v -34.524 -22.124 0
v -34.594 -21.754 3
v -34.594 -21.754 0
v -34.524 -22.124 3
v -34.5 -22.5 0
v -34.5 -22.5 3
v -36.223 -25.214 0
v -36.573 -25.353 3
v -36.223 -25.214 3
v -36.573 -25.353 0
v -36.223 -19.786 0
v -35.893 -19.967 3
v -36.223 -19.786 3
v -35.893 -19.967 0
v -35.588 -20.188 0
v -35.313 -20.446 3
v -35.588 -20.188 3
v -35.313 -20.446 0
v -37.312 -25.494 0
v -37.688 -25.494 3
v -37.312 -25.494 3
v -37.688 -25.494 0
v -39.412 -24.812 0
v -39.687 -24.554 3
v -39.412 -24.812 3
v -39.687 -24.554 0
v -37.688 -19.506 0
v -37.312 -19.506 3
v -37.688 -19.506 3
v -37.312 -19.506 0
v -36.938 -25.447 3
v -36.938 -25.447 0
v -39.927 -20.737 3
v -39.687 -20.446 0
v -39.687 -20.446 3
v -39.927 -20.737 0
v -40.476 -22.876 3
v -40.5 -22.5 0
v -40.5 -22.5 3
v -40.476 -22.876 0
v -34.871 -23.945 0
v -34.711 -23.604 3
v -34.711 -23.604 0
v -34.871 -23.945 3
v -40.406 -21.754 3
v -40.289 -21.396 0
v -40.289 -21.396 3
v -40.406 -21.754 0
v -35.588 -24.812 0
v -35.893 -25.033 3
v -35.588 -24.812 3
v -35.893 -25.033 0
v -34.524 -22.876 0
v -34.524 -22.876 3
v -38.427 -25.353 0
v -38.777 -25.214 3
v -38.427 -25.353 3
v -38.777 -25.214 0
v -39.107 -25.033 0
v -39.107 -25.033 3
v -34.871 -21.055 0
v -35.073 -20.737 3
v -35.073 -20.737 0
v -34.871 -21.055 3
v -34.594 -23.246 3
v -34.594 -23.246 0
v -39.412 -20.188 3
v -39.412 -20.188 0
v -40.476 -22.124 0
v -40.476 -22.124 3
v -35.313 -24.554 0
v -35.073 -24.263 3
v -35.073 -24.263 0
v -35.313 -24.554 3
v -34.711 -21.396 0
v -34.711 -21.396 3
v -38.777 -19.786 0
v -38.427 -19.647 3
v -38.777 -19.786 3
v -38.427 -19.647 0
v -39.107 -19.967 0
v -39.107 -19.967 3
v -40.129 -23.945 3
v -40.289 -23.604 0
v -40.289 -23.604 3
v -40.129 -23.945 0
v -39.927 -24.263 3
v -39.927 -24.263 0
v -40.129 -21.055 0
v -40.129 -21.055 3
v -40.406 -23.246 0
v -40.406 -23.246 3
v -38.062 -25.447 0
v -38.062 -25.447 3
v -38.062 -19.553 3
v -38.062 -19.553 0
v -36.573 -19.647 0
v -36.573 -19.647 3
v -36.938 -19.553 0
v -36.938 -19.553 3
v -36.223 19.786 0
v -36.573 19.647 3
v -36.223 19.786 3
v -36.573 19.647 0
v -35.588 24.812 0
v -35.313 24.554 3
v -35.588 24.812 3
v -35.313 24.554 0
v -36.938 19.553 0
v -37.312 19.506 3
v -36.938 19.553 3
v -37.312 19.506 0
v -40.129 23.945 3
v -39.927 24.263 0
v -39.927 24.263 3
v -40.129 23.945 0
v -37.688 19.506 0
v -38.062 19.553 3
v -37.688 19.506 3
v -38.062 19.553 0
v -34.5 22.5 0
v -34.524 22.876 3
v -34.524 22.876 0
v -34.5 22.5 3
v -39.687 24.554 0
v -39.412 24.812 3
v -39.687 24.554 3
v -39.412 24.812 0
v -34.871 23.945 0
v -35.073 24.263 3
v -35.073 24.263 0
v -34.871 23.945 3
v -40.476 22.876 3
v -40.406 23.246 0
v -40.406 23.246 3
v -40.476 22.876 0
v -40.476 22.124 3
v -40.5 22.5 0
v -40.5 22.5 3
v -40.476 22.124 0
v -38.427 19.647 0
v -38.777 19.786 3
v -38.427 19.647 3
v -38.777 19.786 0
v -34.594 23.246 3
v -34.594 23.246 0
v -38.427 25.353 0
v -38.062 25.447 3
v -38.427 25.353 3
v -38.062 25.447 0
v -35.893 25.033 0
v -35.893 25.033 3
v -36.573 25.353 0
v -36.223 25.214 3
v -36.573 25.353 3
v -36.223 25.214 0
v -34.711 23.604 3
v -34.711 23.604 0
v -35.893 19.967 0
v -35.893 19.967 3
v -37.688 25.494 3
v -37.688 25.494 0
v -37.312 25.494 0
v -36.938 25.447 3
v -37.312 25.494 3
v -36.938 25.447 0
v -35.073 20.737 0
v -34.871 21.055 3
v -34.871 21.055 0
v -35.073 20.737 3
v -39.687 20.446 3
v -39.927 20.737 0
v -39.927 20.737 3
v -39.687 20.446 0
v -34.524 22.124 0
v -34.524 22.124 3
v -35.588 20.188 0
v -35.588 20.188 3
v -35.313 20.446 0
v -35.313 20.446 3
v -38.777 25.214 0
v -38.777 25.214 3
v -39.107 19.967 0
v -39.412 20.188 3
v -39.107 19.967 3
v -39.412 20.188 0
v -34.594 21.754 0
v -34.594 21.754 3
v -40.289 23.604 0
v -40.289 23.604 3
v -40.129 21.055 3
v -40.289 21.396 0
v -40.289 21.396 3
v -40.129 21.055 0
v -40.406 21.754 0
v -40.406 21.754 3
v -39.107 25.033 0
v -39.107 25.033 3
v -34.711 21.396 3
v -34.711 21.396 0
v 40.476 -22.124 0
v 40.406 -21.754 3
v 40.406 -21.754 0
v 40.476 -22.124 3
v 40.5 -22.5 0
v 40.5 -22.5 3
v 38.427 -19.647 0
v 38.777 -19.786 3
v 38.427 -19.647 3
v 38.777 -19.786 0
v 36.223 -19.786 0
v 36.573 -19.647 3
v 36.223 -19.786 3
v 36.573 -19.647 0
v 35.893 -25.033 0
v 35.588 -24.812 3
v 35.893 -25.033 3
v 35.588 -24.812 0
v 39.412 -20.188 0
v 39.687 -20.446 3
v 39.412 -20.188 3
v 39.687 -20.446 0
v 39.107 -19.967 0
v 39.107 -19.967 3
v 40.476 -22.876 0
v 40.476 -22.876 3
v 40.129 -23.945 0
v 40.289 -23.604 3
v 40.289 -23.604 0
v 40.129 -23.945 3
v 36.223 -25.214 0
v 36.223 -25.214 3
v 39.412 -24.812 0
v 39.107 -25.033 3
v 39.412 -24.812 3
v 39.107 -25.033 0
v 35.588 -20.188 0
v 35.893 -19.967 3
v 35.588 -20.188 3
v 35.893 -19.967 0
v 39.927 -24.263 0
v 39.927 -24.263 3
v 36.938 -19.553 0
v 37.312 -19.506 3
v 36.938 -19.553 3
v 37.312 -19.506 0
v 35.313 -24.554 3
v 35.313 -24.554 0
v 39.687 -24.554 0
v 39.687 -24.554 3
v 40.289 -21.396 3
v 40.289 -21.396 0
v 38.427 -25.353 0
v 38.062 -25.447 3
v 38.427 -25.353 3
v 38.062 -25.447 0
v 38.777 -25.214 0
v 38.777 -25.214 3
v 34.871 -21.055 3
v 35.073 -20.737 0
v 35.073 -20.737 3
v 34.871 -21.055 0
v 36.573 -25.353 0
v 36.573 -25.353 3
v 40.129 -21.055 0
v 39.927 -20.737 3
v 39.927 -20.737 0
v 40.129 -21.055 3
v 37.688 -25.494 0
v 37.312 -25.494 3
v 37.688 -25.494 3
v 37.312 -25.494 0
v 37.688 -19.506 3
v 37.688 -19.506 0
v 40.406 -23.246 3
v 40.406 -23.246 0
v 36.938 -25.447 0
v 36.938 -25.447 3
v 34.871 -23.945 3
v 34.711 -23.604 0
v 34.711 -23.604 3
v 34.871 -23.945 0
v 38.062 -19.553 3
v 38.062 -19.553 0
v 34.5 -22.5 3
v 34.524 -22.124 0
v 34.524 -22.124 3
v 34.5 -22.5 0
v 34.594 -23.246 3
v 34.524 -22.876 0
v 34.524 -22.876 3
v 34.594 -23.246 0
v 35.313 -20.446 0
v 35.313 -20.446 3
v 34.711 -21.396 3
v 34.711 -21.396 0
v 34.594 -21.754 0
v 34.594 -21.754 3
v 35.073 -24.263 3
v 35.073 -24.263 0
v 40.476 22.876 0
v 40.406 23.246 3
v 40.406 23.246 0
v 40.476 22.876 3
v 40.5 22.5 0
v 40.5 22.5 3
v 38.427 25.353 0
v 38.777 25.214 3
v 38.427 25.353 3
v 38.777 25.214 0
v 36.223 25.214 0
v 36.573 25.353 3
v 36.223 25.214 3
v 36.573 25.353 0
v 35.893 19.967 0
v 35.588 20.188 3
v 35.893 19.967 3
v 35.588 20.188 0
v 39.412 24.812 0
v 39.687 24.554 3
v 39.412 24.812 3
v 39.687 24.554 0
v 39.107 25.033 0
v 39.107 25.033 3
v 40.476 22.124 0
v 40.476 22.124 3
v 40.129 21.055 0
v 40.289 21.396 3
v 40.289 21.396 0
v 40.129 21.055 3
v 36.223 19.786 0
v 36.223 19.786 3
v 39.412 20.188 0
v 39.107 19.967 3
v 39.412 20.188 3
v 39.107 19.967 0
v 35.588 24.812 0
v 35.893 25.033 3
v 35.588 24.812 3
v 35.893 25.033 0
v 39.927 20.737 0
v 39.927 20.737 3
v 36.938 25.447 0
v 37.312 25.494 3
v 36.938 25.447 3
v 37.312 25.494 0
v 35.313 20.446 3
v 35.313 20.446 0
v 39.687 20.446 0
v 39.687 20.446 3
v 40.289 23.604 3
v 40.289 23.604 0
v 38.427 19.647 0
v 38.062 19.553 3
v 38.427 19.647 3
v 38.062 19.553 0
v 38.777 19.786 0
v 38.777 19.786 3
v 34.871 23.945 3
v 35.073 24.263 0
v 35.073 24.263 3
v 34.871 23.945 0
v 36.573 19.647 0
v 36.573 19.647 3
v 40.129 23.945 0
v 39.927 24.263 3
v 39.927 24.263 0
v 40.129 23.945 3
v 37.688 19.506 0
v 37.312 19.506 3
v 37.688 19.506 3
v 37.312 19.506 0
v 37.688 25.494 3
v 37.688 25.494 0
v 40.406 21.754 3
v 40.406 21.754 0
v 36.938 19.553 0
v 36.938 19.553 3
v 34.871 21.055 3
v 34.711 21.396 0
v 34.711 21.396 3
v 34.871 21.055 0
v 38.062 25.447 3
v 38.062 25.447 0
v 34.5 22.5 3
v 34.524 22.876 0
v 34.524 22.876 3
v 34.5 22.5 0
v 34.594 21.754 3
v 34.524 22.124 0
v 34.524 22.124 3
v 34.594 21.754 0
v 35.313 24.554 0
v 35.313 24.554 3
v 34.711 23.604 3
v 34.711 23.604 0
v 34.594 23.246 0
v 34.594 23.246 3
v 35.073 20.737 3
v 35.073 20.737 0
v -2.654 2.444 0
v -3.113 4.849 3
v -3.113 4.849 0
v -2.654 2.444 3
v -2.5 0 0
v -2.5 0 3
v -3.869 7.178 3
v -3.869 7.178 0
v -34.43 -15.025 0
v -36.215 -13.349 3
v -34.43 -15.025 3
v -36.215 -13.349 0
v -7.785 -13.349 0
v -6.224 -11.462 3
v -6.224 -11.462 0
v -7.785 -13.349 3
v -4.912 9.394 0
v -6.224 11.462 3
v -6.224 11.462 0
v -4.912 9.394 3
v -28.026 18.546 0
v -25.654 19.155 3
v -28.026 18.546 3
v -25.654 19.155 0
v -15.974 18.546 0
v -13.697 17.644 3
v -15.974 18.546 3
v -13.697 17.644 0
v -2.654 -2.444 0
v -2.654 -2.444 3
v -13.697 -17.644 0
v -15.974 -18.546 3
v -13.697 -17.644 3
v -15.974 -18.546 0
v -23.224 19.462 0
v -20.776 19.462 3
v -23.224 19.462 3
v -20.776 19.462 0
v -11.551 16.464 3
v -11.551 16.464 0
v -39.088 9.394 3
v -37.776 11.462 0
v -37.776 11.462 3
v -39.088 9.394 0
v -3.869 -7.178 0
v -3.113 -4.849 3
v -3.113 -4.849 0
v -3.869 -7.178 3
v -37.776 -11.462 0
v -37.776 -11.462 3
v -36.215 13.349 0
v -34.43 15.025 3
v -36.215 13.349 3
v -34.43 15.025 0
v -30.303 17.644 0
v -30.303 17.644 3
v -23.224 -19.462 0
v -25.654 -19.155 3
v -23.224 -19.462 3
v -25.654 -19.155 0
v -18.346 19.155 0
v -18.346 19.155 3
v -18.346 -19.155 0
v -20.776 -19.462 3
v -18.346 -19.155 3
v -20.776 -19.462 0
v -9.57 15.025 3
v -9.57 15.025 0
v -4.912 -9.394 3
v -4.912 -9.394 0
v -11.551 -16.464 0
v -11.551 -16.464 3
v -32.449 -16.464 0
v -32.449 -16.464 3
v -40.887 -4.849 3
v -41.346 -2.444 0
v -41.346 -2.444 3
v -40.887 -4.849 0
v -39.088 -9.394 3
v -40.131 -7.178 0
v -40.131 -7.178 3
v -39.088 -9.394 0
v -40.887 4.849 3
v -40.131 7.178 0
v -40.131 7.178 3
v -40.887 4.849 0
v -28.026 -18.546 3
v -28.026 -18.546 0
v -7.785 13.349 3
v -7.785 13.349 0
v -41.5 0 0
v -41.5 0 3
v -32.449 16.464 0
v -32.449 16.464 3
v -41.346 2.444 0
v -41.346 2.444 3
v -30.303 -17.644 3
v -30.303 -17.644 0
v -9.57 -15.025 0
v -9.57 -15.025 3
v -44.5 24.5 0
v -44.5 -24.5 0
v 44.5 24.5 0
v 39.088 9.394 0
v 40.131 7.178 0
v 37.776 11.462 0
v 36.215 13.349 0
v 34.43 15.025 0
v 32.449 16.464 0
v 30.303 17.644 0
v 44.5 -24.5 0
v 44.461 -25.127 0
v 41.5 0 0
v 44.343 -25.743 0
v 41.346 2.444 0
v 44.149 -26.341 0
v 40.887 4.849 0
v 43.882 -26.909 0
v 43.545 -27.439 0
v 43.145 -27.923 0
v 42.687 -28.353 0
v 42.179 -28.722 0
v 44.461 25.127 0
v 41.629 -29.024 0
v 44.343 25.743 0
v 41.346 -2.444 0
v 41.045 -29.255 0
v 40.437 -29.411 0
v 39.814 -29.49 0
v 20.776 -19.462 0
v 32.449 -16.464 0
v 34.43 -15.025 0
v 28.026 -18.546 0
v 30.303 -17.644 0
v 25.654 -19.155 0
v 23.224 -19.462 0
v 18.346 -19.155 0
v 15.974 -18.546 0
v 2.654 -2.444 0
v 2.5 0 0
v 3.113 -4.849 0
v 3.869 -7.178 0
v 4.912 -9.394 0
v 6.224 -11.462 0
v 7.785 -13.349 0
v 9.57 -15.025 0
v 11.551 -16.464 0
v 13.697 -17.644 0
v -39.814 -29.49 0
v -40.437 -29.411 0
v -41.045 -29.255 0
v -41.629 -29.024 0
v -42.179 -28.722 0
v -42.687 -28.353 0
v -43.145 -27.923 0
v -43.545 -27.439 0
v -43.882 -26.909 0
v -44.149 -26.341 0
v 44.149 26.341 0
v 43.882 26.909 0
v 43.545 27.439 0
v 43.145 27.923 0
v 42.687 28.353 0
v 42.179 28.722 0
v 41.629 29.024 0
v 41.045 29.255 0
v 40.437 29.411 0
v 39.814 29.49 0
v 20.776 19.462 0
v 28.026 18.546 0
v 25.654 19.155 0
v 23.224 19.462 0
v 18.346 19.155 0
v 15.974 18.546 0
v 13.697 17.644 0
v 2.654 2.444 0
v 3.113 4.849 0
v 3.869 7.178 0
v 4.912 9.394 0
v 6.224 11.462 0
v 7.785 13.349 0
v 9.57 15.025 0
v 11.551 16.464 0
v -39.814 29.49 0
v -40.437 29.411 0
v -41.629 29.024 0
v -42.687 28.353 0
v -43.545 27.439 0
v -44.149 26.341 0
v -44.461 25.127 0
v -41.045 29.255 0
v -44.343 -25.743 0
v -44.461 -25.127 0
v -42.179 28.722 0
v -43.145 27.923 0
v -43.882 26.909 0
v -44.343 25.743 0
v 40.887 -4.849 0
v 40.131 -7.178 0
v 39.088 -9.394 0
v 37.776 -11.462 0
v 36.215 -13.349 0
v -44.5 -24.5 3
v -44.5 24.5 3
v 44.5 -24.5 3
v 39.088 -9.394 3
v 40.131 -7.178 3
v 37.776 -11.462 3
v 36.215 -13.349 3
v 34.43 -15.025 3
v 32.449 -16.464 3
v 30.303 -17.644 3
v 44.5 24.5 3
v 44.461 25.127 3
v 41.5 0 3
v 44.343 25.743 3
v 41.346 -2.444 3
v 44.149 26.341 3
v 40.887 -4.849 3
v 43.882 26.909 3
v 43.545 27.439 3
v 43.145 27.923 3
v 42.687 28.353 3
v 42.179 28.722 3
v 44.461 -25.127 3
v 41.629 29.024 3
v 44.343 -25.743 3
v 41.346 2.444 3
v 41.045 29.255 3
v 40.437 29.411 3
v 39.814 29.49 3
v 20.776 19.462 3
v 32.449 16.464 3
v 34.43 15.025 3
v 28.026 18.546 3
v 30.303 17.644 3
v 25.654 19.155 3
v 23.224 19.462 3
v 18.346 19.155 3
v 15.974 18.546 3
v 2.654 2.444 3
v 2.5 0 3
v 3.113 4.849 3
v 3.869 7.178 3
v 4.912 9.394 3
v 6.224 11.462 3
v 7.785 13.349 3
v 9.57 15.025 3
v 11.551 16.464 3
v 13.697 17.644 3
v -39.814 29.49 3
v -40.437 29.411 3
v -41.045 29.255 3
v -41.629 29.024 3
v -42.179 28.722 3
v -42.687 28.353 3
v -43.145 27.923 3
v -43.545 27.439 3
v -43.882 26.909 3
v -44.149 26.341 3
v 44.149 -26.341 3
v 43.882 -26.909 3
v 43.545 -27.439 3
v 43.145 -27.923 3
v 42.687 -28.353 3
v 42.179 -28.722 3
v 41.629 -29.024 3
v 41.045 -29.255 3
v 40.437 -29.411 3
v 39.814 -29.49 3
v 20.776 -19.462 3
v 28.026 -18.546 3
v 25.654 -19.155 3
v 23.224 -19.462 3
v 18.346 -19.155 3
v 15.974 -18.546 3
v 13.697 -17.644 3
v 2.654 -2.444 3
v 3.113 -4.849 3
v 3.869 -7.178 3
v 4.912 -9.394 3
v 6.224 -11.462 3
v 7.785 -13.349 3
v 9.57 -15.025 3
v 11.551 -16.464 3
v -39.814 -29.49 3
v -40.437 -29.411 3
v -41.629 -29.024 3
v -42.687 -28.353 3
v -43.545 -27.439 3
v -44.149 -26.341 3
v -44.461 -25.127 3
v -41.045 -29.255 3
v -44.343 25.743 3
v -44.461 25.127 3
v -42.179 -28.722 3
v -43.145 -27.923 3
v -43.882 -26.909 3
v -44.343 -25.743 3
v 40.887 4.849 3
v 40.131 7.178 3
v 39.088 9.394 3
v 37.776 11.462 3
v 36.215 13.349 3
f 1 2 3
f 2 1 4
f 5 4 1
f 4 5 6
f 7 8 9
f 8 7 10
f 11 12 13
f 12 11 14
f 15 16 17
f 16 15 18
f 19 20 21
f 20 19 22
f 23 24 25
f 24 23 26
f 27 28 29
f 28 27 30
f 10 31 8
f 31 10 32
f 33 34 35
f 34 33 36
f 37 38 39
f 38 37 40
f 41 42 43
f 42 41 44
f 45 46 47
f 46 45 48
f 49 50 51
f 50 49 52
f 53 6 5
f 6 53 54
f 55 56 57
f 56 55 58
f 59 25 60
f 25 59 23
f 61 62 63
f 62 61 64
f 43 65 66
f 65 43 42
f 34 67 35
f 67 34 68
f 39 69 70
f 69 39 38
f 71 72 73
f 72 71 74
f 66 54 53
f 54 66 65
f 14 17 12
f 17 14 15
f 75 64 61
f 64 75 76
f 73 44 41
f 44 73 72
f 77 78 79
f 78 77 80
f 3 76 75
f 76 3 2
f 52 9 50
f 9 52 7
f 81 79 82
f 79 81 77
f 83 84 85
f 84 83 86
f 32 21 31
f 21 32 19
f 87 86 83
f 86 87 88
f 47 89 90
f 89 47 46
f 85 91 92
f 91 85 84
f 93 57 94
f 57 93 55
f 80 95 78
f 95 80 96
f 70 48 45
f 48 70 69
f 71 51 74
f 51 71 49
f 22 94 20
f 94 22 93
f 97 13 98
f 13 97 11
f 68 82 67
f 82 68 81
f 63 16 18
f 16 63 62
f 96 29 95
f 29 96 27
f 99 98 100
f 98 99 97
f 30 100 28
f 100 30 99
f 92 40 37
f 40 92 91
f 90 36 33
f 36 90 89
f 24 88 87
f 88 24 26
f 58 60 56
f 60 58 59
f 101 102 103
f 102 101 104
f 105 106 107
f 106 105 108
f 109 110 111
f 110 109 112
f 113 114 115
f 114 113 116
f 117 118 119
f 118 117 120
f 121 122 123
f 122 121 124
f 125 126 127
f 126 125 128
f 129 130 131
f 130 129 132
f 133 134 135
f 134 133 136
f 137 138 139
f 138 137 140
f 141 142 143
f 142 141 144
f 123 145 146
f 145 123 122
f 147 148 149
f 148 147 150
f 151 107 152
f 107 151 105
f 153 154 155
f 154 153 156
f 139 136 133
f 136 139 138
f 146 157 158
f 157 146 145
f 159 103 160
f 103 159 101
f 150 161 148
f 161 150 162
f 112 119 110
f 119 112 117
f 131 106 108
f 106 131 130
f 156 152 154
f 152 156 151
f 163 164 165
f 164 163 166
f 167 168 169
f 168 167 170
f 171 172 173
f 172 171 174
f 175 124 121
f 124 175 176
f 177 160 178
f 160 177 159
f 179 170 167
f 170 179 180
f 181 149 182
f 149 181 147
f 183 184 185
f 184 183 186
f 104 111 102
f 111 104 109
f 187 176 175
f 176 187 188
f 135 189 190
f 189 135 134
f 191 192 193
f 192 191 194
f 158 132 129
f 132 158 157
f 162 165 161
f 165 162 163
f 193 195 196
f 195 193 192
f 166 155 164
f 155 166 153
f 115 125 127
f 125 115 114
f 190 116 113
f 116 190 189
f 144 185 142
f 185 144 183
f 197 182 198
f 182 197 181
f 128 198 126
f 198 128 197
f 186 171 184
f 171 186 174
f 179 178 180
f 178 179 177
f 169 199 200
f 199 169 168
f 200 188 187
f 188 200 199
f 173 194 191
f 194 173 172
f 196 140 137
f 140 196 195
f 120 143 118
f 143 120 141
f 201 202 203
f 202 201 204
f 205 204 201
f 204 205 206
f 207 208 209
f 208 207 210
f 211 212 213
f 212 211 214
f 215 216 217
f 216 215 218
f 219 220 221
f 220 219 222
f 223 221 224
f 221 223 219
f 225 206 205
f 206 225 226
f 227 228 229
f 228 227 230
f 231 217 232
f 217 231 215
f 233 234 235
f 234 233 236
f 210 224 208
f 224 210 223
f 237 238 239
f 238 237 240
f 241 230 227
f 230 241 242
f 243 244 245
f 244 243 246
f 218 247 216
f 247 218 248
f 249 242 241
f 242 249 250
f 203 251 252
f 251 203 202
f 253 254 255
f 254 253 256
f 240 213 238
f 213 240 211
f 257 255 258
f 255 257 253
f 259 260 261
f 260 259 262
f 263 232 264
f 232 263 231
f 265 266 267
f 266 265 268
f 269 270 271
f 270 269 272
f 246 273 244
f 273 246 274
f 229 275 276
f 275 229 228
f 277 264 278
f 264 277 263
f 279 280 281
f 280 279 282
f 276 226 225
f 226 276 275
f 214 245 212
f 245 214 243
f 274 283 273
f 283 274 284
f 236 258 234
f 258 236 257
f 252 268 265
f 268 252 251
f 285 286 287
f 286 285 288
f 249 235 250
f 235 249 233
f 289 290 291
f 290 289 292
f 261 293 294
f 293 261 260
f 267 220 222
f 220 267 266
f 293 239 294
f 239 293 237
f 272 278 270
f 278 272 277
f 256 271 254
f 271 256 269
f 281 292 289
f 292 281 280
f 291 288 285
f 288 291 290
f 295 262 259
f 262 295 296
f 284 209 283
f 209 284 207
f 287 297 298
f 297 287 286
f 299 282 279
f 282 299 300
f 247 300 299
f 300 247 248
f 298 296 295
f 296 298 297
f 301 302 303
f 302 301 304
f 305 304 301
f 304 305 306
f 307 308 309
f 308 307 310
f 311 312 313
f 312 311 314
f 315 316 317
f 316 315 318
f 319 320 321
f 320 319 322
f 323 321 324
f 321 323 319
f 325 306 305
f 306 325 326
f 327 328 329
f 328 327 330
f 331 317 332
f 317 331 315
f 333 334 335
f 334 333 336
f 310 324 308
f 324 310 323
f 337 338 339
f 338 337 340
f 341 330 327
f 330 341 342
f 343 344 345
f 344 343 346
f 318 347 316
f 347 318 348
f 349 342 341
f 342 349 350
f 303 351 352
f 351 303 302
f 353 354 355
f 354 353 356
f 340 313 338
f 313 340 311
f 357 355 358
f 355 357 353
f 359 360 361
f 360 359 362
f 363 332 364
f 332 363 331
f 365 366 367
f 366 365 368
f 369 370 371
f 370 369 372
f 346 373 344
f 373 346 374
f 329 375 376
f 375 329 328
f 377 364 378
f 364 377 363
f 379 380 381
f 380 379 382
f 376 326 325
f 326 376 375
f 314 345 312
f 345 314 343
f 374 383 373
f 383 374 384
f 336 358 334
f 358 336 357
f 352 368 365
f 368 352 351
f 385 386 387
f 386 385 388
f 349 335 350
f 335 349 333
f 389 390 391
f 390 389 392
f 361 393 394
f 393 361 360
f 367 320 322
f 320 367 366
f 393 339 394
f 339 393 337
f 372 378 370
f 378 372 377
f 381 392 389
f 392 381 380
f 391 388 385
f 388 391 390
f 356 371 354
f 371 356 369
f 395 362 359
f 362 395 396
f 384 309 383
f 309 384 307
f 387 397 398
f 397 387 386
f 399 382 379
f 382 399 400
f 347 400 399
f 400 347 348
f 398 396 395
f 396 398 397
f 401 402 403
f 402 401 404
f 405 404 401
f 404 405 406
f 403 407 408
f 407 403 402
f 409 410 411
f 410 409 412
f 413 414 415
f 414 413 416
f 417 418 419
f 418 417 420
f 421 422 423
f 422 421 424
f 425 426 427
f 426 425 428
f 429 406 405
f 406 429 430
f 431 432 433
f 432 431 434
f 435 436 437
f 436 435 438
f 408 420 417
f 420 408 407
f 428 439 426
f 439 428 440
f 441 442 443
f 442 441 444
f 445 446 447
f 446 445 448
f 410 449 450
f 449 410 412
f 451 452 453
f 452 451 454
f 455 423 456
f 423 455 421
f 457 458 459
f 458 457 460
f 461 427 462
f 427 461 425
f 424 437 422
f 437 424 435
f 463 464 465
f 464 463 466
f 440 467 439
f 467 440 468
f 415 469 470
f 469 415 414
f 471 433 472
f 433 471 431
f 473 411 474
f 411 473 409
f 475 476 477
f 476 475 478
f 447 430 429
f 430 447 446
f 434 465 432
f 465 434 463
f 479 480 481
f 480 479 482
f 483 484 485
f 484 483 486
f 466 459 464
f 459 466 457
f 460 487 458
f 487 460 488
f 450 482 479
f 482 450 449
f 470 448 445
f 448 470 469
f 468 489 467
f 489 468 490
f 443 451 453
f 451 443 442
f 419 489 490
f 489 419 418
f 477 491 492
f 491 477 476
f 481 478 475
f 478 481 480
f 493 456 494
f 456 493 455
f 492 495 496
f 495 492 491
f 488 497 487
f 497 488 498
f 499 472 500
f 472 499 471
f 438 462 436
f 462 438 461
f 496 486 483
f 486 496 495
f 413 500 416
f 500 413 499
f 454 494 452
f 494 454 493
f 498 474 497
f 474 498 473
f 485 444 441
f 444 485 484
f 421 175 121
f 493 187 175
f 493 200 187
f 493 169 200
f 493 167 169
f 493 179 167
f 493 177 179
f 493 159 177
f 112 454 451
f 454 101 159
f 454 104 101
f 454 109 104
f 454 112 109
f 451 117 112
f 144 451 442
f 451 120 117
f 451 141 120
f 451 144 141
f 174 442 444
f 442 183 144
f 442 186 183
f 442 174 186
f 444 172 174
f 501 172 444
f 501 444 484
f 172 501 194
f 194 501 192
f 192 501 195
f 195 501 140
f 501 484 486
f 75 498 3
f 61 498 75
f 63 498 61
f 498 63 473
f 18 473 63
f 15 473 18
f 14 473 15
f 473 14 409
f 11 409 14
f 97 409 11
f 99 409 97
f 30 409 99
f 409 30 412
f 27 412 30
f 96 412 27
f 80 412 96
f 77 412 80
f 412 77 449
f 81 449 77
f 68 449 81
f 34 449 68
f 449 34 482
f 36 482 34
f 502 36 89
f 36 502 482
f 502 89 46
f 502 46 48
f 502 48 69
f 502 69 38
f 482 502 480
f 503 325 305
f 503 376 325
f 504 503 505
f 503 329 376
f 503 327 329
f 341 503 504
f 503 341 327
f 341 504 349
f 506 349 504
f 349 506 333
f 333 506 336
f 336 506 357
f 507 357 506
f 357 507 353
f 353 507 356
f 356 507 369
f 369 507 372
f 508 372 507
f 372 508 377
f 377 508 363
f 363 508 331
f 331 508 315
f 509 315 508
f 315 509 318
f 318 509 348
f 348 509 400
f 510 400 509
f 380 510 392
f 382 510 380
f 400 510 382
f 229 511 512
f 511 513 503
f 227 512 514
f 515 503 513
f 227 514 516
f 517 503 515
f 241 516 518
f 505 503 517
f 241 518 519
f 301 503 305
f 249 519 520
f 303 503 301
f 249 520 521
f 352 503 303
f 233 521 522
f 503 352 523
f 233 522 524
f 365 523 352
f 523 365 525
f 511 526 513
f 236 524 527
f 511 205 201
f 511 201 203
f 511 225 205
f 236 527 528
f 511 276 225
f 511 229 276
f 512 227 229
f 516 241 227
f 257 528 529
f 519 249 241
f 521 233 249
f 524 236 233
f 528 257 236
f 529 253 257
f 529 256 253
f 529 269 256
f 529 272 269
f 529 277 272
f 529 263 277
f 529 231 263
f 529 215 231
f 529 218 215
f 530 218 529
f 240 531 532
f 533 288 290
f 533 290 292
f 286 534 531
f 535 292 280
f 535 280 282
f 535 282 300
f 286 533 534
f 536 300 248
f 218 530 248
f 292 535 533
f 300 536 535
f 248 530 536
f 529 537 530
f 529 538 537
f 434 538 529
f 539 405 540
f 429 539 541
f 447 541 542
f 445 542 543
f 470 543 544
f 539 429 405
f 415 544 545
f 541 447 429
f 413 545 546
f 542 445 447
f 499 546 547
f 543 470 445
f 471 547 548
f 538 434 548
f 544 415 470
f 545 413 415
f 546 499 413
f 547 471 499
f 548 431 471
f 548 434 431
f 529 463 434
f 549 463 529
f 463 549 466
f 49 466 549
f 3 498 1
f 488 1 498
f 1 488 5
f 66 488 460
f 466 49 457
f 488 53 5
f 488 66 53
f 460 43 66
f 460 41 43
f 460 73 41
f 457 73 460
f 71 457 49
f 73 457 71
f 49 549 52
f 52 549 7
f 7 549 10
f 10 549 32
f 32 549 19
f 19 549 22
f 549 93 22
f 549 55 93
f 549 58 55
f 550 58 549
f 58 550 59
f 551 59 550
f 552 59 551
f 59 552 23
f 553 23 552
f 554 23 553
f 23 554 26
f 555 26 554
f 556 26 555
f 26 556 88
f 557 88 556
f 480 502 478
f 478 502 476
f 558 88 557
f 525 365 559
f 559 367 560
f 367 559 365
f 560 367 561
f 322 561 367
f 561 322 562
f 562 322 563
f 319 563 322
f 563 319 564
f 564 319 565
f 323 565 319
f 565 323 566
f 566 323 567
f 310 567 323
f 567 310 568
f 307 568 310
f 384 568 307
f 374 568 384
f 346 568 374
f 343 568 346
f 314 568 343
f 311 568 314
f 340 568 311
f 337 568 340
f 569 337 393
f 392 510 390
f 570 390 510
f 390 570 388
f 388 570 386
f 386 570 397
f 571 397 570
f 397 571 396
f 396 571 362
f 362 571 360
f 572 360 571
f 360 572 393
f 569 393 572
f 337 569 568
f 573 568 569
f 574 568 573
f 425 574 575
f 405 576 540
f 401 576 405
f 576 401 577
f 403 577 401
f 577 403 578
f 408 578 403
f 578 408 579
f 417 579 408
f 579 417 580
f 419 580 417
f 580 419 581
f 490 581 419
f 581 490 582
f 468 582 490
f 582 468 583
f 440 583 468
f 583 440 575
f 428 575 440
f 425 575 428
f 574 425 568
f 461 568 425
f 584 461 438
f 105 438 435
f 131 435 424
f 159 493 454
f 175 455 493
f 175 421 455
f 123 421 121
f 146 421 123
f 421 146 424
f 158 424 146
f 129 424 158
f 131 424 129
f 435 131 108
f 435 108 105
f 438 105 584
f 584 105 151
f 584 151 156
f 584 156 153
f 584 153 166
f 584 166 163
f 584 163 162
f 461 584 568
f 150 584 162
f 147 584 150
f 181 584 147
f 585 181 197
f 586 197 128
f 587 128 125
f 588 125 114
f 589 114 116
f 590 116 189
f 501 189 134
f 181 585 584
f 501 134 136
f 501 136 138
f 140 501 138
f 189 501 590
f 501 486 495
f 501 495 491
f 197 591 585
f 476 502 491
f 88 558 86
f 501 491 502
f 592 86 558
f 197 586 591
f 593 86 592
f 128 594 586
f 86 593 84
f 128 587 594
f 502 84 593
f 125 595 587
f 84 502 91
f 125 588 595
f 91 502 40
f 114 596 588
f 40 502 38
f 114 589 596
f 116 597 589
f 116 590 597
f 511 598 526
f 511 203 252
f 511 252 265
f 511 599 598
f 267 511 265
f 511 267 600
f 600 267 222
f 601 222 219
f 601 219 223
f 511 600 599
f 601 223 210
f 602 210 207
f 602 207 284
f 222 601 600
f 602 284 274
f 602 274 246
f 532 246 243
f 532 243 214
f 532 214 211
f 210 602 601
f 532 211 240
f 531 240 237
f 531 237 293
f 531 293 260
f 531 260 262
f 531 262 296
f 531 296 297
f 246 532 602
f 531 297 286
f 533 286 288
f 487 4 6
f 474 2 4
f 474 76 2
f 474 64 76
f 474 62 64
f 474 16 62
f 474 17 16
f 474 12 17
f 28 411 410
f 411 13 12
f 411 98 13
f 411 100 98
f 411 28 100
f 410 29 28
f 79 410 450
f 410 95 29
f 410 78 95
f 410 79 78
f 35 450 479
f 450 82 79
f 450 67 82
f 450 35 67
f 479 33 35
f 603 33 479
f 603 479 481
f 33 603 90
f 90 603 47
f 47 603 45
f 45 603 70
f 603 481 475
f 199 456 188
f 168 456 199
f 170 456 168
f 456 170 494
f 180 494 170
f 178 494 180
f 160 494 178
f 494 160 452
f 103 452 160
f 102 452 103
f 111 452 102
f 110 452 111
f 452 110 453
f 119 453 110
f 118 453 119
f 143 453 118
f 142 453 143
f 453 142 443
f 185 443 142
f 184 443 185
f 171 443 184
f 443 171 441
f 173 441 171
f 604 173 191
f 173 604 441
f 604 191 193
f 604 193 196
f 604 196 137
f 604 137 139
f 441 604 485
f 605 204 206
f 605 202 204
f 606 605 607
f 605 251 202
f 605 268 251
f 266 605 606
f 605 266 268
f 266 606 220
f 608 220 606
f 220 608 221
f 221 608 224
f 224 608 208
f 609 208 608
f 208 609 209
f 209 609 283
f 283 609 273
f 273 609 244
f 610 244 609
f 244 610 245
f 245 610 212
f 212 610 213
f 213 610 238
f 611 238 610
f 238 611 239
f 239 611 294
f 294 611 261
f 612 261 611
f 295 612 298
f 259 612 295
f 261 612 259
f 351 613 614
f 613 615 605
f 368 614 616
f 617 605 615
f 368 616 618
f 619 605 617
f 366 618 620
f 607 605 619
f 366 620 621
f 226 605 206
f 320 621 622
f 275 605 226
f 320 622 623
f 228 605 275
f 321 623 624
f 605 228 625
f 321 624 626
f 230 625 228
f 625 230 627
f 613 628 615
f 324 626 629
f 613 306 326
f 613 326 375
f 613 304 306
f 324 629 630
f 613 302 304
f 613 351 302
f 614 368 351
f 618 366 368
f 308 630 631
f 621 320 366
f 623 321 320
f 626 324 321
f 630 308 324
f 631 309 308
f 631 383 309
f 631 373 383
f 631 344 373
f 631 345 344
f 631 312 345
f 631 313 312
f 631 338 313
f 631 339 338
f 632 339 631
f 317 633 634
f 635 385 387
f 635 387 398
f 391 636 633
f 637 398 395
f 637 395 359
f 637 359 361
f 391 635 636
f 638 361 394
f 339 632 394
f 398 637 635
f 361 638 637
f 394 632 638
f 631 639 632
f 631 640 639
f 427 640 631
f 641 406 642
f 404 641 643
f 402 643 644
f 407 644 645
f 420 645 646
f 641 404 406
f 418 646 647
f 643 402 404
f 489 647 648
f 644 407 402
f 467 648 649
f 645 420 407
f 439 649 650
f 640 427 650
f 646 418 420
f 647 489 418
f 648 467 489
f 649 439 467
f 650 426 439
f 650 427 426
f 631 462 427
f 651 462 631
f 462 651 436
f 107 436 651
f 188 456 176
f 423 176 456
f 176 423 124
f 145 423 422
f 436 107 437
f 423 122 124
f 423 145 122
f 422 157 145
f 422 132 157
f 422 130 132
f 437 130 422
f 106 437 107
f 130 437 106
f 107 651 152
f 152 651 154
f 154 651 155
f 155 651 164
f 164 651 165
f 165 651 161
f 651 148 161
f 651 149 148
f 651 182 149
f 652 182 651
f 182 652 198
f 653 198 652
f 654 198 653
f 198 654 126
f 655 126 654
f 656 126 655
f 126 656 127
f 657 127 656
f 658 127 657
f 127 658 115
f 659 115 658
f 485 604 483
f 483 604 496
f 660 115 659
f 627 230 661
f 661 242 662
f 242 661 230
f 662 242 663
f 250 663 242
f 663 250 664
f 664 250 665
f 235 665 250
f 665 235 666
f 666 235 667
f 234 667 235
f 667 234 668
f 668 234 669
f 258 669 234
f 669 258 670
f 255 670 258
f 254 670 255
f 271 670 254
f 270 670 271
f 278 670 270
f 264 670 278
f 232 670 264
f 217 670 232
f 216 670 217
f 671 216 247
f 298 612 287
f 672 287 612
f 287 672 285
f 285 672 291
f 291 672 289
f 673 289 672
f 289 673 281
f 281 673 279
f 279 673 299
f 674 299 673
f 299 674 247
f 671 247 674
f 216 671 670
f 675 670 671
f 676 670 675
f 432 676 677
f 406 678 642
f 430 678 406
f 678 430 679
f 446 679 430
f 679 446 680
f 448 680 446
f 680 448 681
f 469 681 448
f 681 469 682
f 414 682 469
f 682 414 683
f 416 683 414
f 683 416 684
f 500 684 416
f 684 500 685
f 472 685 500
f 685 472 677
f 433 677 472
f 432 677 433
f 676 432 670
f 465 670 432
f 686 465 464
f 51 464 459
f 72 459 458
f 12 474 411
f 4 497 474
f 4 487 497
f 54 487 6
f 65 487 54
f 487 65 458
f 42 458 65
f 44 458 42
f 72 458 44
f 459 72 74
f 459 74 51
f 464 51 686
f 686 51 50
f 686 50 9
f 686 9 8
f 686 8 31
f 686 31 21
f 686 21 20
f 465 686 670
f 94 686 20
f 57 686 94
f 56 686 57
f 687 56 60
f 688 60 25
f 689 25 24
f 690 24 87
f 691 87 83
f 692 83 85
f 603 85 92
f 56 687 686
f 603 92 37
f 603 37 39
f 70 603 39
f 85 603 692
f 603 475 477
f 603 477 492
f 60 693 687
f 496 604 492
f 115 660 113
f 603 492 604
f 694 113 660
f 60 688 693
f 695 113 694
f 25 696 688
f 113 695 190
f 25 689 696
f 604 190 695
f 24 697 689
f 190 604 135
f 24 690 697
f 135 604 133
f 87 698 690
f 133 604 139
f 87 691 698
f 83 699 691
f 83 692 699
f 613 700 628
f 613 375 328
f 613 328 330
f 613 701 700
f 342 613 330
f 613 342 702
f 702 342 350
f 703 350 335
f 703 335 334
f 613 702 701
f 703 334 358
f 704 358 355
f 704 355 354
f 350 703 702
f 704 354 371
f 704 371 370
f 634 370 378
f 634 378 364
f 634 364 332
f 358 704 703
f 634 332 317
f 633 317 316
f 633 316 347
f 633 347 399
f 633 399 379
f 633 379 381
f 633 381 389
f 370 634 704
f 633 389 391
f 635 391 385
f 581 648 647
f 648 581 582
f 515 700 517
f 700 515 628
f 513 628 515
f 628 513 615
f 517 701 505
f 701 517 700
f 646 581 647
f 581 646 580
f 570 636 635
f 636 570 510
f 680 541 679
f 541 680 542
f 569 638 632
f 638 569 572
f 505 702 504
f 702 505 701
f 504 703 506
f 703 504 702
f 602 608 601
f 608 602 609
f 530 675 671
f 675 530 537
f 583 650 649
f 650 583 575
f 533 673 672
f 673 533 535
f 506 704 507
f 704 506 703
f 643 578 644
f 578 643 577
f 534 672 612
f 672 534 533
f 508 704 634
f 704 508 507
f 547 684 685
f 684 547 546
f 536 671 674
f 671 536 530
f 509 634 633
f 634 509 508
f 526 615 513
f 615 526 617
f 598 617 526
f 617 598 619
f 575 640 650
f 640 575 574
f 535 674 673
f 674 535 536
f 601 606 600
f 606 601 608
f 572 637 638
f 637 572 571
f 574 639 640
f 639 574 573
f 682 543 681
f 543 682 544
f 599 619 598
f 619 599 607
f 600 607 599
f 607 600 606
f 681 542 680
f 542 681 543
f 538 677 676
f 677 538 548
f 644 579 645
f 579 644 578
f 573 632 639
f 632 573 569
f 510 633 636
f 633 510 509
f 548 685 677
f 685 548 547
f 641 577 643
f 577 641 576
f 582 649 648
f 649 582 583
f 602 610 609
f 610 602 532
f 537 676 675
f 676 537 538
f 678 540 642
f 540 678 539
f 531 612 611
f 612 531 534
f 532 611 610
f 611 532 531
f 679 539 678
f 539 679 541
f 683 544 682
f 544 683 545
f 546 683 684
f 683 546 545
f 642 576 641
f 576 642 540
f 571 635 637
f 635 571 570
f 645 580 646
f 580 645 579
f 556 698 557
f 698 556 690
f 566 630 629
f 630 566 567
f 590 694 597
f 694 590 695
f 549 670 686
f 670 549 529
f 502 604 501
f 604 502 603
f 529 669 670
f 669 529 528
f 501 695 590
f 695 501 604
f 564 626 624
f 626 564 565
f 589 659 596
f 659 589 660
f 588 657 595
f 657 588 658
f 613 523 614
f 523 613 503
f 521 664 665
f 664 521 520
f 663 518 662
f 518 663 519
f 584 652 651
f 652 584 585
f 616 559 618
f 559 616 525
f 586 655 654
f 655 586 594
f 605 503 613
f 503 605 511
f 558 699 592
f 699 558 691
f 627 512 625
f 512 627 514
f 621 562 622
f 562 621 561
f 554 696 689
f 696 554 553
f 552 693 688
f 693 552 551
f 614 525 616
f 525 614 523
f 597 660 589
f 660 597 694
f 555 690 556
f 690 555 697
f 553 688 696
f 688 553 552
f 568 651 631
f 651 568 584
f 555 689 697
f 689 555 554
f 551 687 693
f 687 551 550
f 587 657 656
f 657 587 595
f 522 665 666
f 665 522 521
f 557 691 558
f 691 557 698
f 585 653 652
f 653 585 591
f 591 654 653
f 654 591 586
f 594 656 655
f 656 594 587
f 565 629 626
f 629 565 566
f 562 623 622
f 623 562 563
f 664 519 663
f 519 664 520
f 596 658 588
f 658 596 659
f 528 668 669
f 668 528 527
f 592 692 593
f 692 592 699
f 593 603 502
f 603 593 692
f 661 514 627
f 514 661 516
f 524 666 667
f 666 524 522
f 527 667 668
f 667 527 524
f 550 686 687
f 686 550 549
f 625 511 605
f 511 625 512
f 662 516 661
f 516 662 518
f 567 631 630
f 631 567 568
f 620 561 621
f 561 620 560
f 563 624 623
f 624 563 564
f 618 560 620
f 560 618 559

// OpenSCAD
$fn = 50;


difference() {
	union() {
		hull() {
			translate(v = [-39.5000000000, 24.5000000000, 0]) {
				cylinder(h = 3, r = 5);
			}
			translate(v = [39.5000000000, 24.5000000000, 0]) {
				cylinder(h = 3, r = 5);
			}
			translate(v = [-39.5000000000, -24.5000000000, 0]) {
				cylinder(h = 3, r = 5);
			}
			translate(v = [39.5000000000, -24.5000000000, 0]) {
				cylinder(h = 3, r = 5);
			}
		}
	}
	union() {
		#translate(v = [-37.5000000000, -22.5000000000, -100.0000000000]) {
			cylinder(h = 200, r = 3.0000000000);
		}
		#translate(v = [-37.5000000000, 22.5000000000, -100.0000000000]) {
			cylinder(h = 200, r = 3.0000000000);
		}
		#translate(v = [37.5000000000, -22.5000000000, -100.0000000000]) {
			cylinder(h = 200, r = 3.0000000000);
		}
		#translate(v = [37.5000000000, 22.5000000000, -100.0000000000]) {
			cylinder(h = 200, r = 3.0000000000);
		}
		#translate(v = [-22.0000000000, 0, 0]) {
			cylinder(h = 3, r = 19.5000000000);
		}
		#translate(v = [22.0000000000, 0, 0]) {
			cylinder(h = 3, r = 19.5000000000);
		}
	}
}
